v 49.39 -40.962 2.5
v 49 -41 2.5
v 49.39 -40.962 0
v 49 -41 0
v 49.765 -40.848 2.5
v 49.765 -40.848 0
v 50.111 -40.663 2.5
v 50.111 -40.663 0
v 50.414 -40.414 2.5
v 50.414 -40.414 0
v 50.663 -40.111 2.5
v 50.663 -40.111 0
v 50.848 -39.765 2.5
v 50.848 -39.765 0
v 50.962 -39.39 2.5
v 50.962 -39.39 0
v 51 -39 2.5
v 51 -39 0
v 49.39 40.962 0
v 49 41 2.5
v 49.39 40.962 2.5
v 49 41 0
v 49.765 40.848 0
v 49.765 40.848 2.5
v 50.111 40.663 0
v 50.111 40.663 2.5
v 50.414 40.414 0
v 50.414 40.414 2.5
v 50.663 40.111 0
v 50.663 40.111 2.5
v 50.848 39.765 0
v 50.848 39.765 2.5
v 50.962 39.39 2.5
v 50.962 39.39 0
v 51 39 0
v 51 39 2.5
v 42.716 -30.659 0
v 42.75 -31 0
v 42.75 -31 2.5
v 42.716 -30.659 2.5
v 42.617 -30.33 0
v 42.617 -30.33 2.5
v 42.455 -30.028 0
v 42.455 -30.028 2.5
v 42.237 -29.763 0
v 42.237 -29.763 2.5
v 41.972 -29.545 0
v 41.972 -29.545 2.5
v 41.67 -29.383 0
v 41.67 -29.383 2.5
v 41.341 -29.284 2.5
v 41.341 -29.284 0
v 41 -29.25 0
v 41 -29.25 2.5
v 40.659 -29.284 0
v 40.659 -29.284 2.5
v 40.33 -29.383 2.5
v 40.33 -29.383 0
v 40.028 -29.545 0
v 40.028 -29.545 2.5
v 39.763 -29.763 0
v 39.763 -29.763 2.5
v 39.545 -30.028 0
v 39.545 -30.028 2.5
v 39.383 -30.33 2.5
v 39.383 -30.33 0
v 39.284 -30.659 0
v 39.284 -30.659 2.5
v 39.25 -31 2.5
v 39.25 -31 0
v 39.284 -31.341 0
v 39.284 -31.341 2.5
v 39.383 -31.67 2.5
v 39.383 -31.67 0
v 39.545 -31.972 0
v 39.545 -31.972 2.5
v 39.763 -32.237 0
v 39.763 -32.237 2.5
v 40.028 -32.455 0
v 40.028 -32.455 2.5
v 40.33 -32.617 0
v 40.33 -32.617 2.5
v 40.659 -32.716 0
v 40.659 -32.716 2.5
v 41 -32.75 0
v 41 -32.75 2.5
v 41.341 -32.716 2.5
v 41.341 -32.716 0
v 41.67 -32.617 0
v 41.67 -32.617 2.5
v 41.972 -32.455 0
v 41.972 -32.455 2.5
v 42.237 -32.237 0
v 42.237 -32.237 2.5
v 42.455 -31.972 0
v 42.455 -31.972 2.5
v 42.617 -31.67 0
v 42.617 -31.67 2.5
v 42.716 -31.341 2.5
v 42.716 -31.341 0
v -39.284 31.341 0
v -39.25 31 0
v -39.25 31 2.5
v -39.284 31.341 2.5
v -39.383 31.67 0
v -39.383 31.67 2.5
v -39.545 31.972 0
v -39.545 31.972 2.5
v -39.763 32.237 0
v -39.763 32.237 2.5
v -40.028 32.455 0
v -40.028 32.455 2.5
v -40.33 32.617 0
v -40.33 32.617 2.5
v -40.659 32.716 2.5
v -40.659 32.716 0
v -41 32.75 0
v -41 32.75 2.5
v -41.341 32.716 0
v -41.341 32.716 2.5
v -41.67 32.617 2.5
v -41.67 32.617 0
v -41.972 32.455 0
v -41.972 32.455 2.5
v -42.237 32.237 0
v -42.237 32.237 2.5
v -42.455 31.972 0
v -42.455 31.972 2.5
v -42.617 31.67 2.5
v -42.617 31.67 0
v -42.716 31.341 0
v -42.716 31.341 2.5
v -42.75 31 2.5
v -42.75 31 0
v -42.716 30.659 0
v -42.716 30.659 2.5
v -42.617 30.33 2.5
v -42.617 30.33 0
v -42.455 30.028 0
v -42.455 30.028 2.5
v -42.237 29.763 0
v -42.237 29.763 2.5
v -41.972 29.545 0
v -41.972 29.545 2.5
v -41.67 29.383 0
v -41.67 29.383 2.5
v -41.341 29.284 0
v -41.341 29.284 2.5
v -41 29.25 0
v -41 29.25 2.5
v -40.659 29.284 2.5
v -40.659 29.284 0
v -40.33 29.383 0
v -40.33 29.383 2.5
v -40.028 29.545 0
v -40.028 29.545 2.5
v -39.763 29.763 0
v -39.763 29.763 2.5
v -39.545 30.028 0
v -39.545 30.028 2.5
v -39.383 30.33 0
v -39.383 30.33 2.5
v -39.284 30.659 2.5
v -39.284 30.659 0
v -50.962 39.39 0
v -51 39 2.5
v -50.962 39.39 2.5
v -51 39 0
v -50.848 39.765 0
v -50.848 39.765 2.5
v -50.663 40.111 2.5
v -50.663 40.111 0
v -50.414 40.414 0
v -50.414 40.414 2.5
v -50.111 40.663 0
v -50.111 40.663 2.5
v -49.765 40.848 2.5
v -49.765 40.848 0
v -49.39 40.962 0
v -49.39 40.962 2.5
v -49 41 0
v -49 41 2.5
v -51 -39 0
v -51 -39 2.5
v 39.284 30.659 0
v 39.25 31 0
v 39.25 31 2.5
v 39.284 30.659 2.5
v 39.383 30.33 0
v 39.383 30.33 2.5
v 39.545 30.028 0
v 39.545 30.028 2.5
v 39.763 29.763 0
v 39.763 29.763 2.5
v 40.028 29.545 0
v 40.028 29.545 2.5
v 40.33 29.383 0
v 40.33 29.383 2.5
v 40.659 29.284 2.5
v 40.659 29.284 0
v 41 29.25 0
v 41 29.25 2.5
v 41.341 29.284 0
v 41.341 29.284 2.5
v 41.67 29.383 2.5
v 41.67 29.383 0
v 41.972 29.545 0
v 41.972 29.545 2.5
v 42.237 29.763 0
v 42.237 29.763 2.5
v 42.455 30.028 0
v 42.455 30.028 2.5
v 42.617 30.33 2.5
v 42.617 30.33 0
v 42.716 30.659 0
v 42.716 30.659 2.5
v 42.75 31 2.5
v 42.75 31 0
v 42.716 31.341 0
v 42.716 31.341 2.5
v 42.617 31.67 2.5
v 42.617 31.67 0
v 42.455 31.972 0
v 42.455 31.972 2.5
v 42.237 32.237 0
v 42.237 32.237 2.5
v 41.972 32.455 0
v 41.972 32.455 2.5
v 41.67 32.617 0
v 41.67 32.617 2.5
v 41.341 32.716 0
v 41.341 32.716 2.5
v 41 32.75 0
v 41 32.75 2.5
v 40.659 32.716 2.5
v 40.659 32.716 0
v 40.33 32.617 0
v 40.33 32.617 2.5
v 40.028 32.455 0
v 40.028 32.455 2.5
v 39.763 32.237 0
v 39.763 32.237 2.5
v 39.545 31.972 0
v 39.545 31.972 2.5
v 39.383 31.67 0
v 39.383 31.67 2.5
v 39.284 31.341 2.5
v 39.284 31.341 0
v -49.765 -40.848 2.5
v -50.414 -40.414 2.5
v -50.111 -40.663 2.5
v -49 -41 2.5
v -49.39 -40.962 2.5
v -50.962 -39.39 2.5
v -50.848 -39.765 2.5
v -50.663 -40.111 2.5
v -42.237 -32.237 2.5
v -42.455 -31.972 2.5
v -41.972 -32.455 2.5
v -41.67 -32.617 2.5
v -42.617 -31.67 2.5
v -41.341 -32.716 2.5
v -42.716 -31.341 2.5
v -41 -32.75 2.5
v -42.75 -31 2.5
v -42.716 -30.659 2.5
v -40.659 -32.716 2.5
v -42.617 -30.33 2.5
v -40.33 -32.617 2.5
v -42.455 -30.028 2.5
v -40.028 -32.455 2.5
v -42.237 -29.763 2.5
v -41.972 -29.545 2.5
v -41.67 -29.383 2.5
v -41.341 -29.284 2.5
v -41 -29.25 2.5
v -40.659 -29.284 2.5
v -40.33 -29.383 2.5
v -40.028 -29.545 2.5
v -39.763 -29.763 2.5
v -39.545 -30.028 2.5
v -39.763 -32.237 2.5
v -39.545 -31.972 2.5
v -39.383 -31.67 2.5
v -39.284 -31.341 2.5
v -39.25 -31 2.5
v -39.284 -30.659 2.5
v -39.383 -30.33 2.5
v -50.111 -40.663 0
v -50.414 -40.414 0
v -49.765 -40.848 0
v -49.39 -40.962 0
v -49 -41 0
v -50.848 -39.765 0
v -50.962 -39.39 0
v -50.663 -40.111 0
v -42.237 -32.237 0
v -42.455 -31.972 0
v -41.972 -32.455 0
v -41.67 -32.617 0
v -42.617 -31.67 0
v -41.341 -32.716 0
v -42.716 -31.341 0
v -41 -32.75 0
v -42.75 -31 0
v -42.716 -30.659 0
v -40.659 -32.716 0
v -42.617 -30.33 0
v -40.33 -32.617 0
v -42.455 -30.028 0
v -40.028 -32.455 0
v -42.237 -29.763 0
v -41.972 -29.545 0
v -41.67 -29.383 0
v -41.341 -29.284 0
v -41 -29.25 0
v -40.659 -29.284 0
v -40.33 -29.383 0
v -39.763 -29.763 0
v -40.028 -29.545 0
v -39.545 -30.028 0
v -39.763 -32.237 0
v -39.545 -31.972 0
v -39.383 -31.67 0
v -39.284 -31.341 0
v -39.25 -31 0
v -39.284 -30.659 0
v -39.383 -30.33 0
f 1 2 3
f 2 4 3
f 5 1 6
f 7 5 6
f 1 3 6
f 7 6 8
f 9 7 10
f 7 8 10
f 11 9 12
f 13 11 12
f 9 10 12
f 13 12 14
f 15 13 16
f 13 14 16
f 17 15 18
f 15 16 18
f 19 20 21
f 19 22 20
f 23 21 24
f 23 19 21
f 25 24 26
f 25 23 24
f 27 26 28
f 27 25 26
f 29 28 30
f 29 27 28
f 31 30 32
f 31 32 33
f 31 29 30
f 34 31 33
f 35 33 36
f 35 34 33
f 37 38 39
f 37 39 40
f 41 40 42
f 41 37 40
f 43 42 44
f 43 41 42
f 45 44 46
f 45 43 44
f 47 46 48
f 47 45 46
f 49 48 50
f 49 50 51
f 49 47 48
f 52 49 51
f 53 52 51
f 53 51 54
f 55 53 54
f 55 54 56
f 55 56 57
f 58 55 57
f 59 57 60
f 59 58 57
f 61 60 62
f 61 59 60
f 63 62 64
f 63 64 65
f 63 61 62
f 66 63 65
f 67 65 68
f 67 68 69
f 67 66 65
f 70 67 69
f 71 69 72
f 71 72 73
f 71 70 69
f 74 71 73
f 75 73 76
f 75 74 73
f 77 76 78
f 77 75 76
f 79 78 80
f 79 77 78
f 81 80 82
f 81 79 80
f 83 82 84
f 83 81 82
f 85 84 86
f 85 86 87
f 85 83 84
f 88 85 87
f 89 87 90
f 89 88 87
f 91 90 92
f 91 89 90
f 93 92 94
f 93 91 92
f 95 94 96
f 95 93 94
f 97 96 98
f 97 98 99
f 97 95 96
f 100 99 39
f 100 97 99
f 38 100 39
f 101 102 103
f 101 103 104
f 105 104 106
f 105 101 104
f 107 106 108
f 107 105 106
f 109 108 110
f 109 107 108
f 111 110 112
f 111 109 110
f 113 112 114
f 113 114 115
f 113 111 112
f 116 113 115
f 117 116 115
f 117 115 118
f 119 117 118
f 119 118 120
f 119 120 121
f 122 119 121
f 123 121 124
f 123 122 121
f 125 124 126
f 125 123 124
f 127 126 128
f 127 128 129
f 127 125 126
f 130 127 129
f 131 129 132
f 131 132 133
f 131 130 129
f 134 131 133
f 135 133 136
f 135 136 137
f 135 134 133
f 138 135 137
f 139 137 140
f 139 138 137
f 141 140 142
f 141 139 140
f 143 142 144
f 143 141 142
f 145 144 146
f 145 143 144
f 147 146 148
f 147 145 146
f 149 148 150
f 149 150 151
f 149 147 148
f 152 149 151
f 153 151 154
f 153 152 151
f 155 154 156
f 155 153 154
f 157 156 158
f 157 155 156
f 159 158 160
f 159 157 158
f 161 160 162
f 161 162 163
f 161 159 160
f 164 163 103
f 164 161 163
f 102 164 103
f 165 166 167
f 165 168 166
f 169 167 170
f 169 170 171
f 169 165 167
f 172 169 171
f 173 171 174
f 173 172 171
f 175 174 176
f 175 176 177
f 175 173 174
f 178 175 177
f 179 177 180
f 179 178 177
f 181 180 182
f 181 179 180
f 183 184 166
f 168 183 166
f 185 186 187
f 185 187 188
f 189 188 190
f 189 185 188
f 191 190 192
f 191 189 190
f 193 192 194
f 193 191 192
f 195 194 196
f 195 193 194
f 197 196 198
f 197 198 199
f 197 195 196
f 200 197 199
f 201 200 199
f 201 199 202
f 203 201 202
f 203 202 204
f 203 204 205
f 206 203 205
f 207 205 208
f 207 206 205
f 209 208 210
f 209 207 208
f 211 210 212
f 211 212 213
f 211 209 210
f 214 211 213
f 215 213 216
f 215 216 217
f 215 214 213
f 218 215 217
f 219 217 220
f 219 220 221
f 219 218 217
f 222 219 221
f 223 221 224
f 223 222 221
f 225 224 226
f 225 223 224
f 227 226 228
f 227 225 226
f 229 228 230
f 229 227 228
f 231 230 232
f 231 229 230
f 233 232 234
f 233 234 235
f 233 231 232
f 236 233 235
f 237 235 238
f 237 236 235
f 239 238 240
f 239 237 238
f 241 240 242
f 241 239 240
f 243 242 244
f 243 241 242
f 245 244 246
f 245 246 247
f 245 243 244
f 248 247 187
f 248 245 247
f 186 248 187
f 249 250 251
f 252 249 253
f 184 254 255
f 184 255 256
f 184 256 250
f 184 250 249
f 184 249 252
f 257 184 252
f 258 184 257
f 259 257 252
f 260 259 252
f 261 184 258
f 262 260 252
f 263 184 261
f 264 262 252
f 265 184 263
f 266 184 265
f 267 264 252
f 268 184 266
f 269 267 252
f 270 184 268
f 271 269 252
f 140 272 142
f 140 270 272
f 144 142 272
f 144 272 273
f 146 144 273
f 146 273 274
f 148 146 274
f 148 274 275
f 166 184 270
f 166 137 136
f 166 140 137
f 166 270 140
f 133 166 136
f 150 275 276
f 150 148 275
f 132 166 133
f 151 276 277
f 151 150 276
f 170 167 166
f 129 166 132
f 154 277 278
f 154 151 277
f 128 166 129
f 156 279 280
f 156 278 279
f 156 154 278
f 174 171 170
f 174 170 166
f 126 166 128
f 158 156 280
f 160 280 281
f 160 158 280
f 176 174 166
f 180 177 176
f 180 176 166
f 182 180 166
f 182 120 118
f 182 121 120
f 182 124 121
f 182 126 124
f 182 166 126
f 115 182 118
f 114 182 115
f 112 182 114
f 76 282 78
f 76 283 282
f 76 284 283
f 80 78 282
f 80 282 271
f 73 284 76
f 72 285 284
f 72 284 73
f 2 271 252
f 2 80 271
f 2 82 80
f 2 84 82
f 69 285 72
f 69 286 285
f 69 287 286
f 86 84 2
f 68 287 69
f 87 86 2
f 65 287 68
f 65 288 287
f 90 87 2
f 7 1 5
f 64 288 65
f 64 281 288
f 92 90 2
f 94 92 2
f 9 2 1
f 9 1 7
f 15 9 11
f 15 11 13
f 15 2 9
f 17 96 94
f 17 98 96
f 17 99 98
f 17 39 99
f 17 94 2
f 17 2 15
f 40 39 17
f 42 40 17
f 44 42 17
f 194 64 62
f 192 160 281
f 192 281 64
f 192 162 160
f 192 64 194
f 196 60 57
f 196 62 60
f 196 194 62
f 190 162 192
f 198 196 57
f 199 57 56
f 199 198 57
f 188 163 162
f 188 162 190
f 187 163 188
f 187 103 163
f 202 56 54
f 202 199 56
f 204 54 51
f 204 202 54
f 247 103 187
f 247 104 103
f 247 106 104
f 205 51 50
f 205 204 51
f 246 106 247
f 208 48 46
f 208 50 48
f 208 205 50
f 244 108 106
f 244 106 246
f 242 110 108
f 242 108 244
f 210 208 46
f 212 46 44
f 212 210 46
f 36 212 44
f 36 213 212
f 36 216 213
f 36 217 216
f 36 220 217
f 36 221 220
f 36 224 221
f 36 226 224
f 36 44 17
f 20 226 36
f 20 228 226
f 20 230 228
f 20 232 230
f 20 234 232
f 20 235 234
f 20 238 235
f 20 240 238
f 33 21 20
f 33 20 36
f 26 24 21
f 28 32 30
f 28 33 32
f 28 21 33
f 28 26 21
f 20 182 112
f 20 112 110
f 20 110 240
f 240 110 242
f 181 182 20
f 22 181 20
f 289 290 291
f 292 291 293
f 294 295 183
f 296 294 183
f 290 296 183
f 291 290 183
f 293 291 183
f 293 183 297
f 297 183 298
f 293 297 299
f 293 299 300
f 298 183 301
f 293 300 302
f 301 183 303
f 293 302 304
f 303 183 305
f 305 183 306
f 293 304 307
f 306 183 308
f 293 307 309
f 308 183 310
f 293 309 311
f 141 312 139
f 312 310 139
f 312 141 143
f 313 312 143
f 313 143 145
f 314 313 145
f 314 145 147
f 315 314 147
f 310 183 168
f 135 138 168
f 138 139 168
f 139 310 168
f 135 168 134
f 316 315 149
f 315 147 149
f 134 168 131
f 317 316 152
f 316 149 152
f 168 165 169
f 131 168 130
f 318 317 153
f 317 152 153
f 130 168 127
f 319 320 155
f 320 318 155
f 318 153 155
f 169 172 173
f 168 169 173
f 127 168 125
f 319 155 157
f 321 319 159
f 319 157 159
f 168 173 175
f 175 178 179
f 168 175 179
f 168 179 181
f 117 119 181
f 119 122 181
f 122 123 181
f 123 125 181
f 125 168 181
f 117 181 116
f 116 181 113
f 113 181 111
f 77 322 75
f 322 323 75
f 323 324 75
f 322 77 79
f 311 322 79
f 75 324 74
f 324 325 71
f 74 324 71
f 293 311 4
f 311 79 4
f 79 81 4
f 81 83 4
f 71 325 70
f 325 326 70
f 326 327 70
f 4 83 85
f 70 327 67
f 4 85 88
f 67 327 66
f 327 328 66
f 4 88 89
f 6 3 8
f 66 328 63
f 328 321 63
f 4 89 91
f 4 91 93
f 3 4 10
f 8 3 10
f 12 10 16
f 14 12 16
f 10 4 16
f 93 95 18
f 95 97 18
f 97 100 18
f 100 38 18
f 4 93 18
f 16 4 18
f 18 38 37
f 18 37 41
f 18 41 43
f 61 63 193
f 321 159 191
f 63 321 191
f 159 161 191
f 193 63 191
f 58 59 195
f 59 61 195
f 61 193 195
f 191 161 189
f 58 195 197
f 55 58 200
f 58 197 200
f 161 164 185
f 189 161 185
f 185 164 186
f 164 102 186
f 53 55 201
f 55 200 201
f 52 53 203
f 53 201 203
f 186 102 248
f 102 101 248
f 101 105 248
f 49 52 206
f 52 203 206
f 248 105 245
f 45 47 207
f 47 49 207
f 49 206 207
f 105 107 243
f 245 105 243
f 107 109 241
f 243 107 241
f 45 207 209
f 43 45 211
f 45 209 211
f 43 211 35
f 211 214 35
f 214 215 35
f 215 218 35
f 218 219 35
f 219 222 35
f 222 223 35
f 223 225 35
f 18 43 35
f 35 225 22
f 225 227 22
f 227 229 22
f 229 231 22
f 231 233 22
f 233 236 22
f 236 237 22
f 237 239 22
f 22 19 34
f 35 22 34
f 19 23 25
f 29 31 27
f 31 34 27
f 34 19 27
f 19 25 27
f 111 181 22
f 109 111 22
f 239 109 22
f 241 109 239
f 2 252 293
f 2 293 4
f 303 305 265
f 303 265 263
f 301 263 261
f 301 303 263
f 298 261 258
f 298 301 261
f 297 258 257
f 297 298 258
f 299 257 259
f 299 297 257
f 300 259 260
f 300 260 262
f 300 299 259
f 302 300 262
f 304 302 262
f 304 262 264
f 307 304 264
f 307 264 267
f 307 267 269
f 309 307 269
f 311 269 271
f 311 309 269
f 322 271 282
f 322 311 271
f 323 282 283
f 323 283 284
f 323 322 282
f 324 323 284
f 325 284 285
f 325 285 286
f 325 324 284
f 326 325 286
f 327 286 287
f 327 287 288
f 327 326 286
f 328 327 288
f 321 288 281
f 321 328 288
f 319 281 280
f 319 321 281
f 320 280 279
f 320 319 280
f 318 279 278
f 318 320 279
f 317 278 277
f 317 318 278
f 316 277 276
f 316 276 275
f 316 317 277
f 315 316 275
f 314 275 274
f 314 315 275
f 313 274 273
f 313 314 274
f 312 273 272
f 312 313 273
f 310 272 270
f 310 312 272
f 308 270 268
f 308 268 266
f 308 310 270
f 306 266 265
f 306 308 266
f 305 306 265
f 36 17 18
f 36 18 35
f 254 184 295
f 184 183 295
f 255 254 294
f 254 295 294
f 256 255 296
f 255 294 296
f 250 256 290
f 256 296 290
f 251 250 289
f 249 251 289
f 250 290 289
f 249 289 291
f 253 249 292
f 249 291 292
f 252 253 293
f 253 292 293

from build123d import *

# Parameters (mm, degrees)
SKETCH_1_W      = 90
SKETCH_1_H      = 70
SKETCH_1_R      = 1.75
EXTRUDE_1_DEPTH = 2.5
SKETCH_2_W      = 102
SKETCH_2_H      = 82
SKETCH_2_W_2    = 90
SKETCH_2_H_2    = 70
EXTRUDE_2_DEPTH = 2.5
FILLET_1_R      = 2


with BuildPart() as part:
    # 草圖1 → 填料-伸長1 (new body)
    with BuildSketch(Plane.XY):
        Rectangle(SKETCH_1_W, SKETCH_1_H)
        with Locations((-41, 31)):
            Circle(SKETCH_1_R, mode=Mode.SUBTRACT)
        with Locations(Location((41, 31, 0), (0, 0, 180))):
            Circle(SKETCH_1_R, mode=Mode.SUBTRACT)
        with Locations((41, -31)):
            Circle(SKETCH_1_R, mode=Mode.SUBTRACT)
        with Locations(Location((-41, -31, 0), (0, 0, 180))):
            Circle(SKETCH_1_R, mode=Mode.SUBTRACT)
    extrude(amount=EXTRUDE_1_DEPTH)

    # 草圖2 → 填料-伸長2 (add)
    with BuildSketch(Plane.XY.offset(2.5)):
        Rectangle(SKETCH_2_W, SKETCH_2_H)
        Rectangle(SKETCH_2_W_2, SKETCH_2_H_2, mode=Mode.SUBTRACT)
    extrude(amount=-EXTRUDE_2_DEPTH)

    # 圓角1
    fillet_1_edges = [part.edges().sort_by_distance(p)[0] for p in [
        (-51, -41, 1.25),
        (-51, 41, 1.25),
        (51, 41, 1.25),
        (51, -41, 1.25),
    ]]
    fillet(fillet_1_edges, radius=FILLET_1_R)


solid = part.part
